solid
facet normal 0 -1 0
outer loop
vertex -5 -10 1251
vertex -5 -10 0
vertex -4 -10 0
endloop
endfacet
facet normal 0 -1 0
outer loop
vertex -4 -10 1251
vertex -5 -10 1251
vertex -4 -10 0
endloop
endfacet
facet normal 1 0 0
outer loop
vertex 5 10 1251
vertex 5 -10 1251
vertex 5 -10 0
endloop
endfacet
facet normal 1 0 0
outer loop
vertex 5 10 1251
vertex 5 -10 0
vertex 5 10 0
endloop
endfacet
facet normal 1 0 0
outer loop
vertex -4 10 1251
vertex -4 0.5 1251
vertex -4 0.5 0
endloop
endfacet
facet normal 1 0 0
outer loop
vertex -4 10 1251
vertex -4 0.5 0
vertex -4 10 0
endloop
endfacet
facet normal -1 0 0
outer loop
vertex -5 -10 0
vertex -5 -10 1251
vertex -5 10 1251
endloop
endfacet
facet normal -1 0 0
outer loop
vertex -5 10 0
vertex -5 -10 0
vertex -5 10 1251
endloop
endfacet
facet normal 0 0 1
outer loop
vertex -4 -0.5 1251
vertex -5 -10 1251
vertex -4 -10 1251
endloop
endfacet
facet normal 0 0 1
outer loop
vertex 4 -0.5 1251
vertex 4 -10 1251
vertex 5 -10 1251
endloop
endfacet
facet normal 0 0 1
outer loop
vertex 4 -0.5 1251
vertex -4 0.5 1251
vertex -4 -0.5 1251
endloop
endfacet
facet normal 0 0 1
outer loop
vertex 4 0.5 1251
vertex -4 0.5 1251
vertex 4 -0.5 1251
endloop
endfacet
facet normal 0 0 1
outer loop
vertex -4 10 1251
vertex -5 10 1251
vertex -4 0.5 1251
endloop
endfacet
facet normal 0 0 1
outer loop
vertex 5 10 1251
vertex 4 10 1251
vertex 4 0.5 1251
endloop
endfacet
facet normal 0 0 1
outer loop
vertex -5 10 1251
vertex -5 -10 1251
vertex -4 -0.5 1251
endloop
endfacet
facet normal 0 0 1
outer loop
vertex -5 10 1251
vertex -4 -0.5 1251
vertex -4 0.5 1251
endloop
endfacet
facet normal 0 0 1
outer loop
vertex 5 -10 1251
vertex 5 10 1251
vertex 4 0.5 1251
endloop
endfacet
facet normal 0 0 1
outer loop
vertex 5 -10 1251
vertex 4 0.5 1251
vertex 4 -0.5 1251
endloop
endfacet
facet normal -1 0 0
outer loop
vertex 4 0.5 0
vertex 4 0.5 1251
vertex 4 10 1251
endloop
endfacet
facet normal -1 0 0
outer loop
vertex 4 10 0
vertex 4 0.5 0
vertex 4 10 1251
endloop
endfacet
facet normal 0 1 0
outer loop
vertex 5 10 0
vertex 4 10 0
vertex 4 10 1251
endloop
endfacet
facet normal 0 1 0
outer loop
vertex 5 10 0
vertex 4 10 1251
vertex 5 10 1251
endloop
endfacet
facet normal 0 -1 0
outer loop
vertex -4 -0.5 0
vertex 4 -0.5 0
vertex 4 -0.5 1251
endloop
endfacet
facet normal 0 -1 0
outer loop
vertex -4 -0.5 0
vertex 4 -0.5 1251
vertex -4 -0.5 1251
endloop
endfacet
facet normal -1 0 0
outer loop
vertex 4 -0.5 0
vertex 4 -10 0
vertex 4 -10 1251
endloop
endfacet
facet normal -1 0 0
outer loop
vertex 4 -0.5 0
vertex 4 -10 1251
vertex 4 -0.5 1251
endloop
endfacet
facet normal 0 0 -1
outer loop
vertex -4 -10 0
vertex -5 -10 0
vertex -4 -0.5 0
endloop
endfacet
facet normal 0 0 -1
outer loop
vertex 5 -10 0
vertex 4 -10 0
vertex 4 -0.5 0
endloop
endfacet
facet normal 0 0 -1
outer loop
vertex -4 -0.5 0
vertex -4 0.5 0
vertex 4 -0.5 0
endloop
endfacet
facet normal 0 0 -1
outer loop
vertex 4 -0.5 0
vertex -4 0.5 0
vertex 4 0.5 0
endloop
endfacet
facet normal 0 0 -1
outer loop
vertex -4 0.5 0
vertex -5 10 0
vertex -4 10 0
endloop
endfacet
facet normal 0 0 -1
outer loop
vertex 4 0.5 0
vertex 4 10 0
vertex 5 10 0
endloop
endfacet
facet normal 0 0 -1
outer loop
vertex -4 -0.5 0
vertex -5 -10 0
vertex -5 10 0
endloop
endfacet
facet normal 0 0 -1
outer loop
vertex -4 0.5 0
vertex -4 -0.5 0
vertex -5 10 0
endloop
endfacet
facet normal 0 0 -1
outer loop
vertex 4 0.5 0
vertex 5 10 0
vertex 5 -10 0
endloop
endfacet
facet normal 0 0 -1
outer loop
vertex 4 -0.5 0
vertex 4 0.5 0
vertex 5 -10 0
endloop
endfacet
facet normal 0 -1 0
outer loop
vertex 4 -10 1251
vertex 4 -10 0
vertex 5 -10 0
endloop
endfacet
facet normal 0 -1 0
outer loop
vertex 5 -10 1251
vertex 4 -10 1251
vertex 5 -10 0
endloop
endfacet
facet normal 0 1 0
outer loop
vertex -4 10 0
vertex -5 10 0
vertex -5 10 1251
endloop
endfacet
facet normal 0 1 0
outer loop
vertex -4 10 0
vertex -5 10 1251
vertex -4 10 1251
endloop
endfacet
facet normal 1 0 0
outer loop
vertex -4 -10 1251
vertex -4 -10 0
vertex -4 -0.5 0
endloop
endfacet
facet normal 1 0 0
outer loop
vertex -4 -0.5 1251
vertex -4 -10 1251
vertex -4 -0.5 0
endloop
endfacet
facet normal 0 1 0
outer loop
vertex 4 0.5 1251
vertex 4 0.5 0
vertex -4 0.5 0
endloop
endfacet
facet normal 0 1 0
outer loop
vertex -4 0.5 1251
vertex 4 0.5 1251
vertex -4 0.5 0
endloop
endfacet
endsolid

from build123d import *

# Parameters (mm, degrees)
SKETCH_1_W          = 10
SKETCH_1_H          = 20
EXTRUDE_1_DEPTH     = 1251
SKETCH_2_W          = 8
SKETCH_2_H          = 19
CUT_EXTRUDE_1_DEPTH = 2503


with BuildPart() as part:
    # 草图1 → 凸台-拉伸1 (new body)
    with BuildSketch(Plane.XY):
        Rectangle(SKETCH_1_W, SKETCH_1_H)
    extrude(amount=EXTRUDE_1_DEPTH)

    # 草图2 → 切除-拉伸1 (cut)
    with BuildSketch(Plane(origin=(0, 0, 0), x_dir=(-1, 0, 0), z_dir=(0, 0, -1))):
        with Locations((0, 10)):
            Rectangle(SKETCH_2_W, SKETCH_2_H)
        with Locations((0, -10)):
            Rectangle(SKETCH_2_W, SKETCH_2_H)
    extrude(amount=-CUT_EXTRUDE_1_DEPTH, mode=Mode.SUBTRACT)


solid = part.part
